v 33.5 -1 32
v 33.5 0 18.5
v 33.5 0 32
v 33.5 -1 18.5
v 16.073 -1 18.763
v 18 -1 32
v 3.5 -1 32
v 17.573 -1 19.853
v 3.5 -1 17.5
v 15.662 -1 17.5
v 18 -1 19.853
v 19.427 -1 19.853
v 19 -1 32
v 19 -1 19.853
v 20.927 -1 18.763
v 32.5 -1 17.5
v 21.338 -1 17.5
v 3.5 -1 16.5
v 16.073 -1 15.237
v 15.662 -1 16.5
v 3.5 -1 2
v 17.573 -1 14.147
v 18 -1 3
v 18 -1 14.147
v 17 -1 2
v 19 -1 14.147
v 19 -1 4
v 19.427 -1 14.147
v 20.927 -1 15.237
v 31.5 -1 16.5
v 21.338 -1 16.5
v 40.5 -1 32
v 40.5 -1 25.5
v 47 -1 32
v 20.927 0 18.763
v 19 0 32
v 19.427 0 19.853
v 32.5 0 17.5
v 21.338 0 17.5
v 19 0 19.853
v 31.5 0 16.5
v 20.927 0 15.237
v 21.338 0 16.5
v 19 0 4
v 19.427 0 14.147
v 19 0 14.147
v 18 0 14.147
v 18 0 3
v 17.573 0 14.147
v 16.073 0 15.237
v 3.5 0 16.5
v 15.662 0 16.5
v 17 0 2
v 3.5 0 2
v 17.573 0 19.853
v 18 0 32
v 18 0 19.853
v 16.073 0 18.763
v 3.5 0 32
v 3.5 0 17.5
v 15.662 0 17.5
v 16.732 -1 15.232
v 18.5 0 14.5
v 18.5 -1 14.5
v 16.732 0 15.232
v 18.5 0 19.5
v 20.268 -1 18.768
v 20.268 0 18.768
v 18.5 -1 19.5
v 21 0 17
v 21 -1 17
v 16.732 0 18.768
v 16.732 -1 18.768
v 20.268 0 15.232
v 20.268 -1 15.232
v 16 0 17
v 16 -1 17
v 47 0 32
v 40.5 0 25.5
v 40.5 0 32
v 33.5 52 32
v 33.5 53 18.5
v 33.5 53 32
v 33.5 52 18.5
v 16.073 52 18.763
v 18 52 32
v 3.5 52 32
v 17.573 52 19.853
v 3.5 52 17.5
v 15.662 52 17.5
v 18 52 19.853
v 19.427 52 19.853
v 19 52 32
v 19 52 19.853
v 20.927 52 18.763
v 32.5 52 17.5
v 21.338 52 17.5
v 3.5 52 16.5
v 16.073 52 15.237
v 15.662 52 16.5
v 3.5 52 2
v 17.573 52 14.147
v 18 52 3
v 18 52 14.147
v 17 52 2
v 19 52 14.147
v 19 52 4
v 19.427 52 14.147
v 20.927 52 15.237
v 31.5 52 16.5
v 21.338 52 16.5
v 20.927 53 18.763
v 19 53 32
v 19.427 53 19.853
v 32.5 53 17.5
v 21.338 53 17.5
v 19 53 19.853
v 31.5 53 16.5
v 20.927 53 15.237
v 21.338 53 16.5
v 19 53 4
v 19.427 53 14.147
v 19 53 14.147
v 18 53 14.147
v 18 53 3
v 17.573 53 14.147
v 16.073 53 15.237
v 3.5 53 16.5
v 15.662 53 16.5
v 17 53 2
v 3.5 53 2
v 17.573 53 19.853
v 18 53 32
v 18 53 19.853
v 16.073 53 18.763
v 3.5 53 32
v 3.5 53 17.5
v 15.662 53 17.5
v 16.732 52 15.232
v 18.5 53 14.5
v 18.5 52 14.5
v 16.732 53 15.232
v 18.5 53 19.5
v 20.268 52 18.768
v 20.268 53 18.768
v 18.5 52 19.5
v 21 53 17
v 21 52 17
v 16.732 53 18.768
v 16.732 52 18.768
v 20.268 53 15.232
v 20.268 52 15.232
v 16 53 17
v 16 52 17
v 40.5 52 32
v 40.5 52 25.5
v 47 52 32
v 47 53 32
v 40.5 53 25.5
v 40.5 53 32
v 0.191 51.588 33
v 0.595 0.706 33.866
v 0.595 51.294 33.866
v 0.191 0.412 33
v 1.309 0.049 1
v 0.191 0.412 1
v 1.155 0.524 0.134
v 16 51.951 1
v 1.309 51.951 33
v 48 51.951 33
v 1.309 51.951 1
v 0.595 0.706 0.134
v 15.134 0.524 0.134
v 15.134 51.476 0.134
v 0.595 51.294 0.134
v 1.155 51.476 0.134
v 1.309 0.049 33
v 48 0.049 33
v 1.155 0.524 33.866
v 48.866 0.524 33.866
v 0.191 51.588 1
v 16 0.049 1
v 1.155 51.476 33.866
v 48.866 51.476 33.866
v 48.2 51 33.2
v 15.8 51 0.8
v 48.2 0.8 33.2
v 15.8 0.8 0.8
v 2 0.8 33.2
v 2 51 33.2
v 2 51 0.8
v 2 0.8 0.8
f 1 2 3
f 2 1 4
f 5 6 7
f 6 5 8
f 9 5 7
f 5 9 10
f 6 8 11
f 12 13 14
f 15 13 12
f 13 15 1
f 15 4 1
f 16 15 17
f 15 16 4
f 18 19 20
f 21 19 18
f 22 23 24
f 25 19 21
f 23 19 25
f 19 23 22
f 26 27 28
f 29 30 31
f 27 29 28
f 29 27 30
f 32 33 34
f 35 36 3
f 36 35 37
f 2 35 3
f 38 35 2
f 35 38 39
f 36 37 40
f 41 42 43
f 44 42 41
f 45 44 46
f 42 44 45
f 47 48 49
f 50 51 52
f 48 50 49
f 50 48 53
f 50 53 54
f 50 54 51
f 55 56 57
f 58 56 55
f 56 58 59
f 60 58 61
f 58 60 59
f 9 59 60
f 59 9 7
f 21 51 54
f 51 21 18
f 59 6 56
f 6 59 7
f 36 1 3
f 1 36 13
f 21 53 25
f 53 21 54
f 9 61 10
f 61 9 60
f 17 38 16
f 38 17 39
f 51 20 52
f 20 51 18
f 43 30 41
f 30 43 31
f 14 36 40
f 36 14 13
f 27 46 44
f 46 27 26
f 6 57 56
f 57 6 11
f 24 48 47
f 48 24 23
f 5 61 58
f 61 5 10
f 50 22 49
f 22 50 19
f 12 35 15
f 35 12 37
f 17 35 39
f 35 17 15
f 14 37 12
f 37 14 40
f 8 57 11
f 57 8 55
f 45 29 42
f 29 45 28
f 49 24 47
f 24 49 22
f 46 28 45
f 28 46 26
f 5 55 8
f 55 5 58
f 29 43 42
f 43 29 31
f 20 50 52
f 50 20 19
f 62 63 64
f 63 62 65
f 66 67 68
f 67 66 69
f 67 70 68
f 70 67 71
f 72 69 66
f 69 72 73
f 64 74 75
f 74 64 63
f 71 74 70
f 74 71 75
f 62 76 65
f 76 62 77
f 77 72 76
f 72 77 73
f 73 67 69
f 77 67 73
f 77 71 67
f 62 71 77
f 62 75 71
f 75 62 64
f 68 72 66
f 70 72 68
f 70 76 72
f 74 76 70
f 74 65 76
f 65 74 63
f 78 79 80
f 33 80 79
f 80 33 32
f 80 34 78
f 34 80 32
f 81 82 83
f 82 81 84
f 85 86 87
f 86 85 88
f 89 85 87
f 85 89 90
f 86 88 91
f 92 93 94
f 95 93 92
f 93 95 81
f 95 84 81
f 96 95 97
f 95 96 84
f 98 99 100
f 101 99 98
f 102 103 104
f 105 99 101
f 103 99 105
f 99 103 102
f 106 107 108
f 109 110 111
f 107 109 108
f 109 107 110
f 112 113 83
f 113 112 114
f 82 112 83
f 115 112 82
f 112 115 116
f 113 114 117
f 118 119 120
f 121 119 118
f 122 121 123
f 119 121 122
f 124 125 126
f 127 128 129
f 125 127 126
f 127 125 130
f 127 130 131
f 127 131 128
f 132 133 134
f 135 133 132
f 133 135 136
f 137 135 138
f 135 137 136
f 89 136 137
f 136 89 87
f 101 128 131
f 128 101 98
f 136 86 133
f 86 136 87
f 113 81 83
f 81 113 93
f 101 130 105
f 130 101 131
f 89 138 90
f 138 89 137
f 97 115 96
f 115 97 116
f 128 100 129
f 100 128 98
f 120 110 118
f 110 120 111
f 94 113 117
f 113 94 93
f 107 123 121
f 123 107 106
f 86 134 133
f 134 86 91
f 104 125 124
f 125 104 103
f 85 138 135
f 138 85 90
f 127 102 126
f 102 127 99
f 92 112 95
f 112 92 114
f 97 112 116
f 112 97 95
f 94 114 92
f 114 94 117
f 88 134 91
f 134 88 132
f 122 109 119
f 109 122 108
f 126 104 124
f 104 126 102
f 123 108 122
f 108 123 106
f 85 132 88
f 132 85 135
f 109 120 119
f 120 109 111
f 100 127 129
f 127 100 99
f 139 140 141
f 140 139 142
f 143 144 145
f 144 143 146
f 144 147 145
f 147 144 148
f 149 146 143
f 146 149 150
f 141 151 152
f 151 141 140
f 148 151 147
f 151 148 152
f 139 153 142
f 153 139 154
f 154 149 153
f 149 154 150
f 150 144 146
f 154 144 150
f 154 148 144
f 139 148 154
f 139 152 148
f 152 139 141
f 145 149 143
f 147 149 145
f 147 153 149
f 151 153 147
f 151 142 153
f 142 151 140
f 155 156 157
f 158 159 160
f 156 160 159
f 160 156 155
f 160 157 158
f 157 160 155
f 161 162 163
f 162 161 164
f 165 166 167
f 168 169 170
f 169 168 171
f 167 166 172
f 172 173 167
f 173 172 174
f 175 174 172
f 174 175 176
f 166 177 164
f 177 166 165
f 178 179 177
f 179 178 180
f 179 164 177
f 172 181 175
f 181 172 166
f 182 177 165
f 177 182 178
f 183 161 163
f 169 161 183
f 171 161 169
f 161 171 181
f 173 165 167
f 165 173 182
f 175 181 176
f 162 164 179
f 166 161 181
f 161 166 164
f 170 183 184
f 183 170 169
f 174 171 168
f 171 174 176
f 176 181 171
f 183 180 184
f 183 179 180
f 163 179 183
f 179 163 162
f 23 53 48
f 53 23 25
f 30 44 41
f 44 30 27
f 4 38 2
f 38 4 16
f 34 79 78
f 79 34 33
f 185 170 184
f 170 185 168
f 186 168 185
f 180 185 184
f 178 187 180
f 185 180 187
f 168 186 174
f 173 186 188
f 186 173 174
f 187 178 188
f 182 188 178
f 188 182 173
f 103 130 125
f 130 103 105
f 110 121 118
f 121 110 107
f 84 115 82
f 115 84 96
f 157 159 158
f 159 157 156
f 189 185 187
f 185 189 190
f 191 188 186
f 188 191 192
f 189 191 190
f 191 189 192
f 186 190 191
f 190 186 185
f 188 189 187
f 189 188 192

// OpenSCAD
module panel(x,y,z)
{
    translate([x,y,z]) rotate([90,0,0]) {
    difference() {
        cube([30,30,1]);
        translate([0,14.5,0]) cube([30,1,1]);
        translate([14.5,0,0]) cube([1,30,1]);
        translate([15,15,0]) cylinder(h=1,r=3);
    }
    translate([15,15,0]) cylinder(h=1,r=2.5);
    }
}

l=70;
w=48;
h=30;
t=2;
difference() {
    union() {
    hull() {
    translate([1,1,1]) sphere(r=1);
    translate([1,1,h+t+1]) sphere(r=1);
    translate([l+t,1,h+t+1]) sphere(r=1);
    translate([l+t,1,1]) sphere(r=1);
    translate([1,w+t+1,1]) sphere(r=1);
    translate([1,w+t+1,h+t+1]) sphere(r=1);
    translate([l+t,w+t+1,h+t+1]) sphere(r=1);
    translate([l+t,w+t+1,1]) sphere(r=1);
    }
    panel(3.5,0,2);
    panel(40.5,0,2);
    panel(3.5,53,2);
    panel(40.5,53,2);
    }
    translate([15,-1,-l*sqrt(2)]) rotate([0,-45,0]) cube([3*l,w+2*t+3,l]);
    translate([t,t-1.2,t-1.2]) cube([l,w+2.2,h+2.4]);
}
